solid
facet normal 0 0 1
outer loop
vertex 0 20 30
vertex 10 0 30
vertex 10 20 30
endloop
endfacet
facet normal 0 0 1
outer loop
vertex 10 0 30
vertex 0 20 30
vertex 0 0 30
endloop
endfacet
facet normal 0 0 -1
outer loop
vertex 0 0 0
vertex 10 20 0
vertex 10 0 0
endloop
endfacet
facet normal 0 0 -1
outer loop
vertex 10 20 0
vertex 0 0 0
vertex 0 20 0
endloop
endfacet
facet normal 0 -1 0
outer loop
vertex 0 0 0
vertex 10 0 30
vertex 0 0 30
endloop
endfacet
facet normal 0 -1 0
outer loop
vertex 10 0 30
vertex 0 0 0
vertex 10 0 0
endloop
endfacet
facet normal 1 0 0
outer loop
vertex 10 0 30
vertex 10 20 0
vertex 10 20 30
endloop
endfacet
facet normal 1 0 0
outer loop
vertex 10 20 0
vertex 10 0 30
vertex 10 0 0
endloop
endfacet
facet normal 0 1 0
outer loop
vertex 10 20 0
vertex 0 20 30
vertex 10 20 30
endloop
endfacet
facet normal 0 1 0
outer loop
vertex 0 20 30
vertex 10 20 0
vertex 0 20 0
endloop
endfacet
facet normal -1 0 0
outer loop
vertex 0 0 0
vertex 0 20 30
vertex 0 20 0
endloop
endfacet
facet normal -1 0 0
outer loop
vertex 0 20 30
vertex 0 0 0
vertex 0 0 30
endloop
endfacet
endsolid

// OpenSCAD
height = 10;
width = 20;
depth = 30;
cube([height, width, depth]);
